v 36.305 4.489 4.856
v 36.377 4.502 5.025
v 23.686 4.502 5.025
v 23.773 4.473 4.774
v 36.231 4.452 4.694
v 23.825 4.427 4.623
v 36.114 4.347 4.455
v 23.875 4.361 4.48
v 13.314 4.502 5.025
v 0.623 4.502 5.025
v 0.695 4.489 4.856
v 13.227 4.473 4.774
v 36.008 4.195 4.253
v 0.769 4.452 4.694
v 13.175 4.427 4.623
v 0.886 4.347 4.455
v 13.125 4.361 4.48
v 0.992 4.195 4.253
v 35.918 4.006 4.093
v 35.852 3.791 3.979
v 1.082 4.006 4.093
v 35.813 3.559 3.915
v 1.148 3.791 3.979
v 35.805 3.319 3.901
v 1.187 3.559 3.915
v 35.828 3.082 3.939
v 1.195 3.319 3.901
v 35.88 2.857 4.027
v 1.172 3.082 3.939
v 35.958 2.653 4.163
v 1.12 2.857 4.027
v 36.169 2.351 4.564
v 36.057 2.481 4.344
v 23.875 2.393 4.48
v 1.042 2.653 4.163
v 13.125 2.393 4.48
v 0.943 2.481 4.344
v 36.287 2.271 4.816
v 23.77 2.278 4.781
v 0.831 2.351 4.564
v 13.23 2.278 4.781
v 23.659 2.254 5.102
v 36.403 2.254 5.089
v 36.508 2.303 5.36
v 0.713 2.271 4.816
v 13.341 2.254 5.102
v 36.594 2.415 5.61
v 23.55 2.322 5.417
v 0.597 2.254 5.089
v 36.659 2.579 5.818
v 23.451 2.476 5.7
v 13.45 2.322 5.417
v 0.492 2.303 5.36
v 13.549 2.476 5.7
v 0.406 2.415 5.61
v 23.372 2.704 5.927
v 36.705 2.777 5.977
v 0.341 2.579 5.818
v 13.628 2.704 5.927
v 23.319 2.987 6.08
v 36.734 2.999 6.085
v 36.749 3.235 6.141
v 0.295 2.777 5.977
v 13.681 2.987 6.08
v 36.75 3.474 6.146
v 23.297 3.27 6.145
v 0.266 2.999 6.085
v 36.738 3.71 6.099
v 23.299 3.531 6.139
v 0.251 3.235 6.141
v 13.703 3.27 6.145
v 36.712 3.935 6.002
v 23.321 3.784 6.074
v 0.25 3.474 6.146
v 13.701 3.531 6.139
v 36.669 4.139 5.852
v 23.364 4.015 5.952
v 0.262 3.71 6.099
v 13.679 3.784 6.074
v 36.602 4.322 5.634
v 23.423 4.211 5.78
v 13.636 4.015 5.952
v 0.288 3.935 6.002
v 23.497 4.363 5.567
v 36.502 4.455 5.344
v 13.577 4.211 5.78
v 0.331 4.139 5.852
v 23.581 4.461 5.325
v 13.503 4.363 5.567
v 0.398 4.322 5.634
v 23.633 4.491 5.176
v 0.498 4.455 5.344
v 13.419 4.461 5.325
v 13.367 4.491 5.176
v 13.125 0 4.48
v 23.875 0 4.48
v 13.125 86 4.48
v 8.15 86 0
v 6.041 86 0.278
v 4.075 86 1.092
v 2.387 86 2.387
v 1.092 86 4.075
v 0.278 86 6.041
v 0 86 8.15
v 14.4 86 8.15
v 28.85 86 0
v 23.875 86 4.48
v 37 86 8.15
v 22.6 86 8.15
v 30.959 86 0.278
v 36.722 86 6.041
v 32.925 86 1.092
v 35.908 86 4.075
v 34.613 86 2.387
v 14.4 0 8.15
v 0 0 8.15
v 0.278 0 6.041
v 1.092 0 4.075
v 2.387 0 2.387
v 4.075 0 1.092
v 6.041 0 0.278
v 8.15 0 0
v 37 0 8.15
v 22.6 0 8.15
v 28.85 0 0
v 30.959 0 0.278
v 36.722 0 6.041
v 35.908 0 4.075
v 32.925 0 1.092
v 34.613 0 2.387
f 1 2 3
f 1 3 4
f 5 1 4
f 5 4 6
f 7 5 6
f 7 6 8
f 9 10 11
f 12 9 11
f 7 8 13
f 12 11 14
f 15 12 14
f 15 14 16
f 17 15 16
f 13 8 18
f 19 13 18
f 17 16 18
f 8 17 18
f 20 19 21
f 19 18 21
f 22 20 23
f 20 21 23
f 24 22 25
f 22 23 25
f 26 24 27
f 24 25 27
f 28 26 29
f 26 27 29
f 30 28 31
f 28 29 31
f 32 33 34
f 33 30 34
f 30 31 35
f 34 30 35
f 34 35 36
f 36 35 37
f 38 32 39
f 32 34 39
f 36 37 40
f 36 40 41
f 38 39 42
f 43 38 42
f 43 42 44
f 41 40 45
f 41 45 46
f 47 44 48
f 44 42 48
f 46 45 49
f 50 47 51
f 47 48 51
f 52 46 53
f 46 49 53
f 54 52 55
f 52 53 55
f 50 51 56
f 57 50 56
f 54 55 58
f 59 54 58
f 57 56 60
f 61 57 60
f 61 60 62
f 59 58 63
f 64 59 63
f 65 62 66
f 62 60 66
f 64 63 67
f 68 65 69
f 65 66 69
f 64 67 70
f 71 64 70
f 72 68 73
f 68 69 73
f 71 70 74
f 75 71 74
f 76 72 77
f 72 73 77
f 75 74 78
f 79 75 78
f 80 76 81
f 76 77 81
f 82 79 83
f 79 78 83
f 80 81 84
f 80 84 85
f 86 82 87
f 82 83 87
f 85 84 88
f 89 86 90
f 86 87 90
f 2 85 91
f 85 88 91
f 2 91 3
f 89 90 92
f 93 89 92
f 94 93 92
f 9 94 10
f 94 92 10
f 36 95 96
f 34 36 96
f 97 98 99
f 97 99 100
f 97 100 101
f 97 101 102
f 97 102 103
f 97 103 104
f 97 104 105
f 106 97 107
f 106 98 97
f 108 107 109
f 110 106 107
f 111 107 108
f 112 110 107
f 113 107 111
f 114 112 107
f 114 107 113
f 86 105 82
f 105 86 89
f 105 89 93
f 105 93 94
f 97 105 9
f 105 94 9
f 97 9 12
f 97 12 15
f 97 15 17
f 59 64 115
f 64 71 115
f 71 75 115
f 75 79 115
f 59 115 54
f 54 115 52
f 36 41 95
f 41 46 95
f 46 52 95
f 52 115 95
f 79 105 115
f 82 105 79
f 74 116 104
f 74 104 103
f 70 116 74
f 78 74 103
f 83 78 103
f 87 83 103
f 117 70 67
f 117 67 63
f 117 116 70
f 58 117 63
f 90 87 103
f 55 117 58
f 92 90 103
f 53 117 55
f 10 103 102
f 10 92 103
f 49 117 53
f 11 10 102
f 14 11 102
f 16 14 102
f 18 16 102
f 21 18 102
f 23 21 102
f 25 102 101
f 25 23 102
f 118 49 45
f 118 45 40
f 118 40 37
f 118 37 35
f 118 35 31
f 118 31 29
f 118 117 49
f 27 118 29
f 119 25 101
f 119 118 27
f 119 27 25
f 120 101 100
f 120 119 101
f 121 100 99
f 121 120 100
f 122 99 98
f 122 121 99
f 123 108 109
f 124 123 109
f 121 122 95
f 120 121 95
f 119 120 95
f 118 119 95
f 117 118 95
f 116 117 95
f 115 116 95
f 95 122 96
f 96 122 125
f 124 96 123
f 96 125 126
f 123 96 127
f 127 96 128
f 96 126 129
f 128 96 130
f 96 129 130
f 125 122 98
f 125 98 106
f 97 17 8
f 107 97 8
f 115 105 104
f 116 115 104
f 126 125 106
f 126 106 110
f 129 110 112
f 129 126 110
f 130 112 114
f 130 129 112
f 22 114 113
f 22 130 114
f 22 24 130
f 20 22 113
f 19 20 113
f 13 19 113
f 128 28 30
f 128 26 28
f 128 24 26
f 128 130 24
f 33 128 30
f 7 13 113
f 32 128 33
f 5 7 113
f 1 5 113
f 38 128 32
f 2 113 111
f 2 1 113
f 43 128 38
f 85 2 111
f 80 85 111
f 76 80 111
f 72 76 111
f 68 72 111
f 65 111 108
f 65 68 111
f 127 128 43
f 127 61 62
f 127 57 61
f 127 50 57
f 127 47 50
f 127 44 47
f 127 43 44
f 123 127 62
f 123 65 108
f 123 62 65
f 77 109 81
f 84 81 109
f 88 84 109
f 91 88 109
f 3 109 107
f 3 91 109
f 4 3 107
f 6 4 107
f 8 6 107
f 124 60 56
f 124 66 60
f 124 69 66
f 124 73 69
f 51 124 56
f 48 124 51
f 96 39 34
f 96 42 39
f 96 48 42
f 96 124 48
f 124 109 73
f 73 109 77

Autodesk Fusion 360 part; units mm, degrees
sketch "Sketch1" plane through (0, 0, 0) normal (0, 1, 0) x (1, 0, 0)
  line L0 (0, 0) -> (37, 0)
  line L1 (37, 0) -> (37, -8.15)
  line L2 (37, -8.15) -> (0, -8.15)
  line L3 (0, -8.15) -> (0, 0)
  line L4 (37, -8.15) -> (28.85, -8.15)
  line L5 (28.85, -8.15) -> (28.85, 0)
  line L6 (28.85, 0) -> (37, 0)
  line L7 (37, 0) -> (37, -8.15)
  arc A0 (37, -8.15) -> (28.85, 0) centre (28.85, -8.15) ccw
  line L8 (0, -8.15) -> (8.15, -8.15)
  line L9 (8.15, -8.15) -> (8.15, 0)
  line L10 (8.15, 0) -> (0, 0)
  line L11 (0, 0) -> (0, -8.15)
  arc A1 (8.15, 0) -> (0, -8.15) centre (8.15, -8.15) ccw
  dimension "d1" = 37
  dimension "d2" = 8.15
  dimension "d3" = 8.15
  dimension "d4" = 8.15
  dimension "d5" = 8.15
  dimension "d6" = 8.15
extrude "Extrude1" add sketch "Sketch1" along normal blind 86 contours L0 L2 L5 L9 | L2 L8 L9 A1 | L2 L4 L5 A0
sketch "Sketch2" plane through (0, 0, 0) normal (0, -1, 0) x (1, 0, 0)
  arc A0 (28.85, 0) -> (37, 8.15) centre (28.85, 8.15) ccw
  line L0 (37, 8.15) -> (0, 8.15)
  arc A1 (0, 8.15) -> (8.15, 0) centre (8.15, 8.15) ccw
  line L1 (8.15, 0) -> (28.85, 0)
  line L2 (18.5, 8.15) -> (18.5, 0)
  line L3 (13.125, 4.48) -> (23.875, 4.48)
  line L4 (14.4, 8.15) -> (22.6, 8.15)
  line L5 (14.4, 8.15) -> (13.125, 4.48)
  line L6 (22.6, 8.15) -> (23.875, 4.48)
  dimension "d9" = 10.75
  dimension "d10" = 3.67
  dimension "d11" = 8.2
extrude "Extrude2" cut sketch "Sketch2" against normal blind 115 contours L0 L2 L3 L4 L6 | L0 L2 L3 L4 L5
sketch "Sketch3" plane through (0, 0, 0) normal (1, 0, 0) x (0, 1, 0)
  circle A0 centre (3.3767, 5.025) radius 1.125
  line L0 (-5, 8) -> (-5, 0)
  line L1 (-3.6483, 8.15) -> (5, 8.15)
  line L2 (5, 8.15) -> (5, -1.85)
  line L3 (5, -1.85) -> (-3.6483, -1.85)
  line L4 (-3.6483, -1.85) -> (-3.6483, 8.15)
  line L5 (0, 8.15) -> (86, 8.15)
  dimension "d14" = 2.25
  dimension "d16" = 5.9
  dimension "d17" = 2
extrude "Extrude3" cut sketch "Sketch3" along normal blind 48 contours A0
